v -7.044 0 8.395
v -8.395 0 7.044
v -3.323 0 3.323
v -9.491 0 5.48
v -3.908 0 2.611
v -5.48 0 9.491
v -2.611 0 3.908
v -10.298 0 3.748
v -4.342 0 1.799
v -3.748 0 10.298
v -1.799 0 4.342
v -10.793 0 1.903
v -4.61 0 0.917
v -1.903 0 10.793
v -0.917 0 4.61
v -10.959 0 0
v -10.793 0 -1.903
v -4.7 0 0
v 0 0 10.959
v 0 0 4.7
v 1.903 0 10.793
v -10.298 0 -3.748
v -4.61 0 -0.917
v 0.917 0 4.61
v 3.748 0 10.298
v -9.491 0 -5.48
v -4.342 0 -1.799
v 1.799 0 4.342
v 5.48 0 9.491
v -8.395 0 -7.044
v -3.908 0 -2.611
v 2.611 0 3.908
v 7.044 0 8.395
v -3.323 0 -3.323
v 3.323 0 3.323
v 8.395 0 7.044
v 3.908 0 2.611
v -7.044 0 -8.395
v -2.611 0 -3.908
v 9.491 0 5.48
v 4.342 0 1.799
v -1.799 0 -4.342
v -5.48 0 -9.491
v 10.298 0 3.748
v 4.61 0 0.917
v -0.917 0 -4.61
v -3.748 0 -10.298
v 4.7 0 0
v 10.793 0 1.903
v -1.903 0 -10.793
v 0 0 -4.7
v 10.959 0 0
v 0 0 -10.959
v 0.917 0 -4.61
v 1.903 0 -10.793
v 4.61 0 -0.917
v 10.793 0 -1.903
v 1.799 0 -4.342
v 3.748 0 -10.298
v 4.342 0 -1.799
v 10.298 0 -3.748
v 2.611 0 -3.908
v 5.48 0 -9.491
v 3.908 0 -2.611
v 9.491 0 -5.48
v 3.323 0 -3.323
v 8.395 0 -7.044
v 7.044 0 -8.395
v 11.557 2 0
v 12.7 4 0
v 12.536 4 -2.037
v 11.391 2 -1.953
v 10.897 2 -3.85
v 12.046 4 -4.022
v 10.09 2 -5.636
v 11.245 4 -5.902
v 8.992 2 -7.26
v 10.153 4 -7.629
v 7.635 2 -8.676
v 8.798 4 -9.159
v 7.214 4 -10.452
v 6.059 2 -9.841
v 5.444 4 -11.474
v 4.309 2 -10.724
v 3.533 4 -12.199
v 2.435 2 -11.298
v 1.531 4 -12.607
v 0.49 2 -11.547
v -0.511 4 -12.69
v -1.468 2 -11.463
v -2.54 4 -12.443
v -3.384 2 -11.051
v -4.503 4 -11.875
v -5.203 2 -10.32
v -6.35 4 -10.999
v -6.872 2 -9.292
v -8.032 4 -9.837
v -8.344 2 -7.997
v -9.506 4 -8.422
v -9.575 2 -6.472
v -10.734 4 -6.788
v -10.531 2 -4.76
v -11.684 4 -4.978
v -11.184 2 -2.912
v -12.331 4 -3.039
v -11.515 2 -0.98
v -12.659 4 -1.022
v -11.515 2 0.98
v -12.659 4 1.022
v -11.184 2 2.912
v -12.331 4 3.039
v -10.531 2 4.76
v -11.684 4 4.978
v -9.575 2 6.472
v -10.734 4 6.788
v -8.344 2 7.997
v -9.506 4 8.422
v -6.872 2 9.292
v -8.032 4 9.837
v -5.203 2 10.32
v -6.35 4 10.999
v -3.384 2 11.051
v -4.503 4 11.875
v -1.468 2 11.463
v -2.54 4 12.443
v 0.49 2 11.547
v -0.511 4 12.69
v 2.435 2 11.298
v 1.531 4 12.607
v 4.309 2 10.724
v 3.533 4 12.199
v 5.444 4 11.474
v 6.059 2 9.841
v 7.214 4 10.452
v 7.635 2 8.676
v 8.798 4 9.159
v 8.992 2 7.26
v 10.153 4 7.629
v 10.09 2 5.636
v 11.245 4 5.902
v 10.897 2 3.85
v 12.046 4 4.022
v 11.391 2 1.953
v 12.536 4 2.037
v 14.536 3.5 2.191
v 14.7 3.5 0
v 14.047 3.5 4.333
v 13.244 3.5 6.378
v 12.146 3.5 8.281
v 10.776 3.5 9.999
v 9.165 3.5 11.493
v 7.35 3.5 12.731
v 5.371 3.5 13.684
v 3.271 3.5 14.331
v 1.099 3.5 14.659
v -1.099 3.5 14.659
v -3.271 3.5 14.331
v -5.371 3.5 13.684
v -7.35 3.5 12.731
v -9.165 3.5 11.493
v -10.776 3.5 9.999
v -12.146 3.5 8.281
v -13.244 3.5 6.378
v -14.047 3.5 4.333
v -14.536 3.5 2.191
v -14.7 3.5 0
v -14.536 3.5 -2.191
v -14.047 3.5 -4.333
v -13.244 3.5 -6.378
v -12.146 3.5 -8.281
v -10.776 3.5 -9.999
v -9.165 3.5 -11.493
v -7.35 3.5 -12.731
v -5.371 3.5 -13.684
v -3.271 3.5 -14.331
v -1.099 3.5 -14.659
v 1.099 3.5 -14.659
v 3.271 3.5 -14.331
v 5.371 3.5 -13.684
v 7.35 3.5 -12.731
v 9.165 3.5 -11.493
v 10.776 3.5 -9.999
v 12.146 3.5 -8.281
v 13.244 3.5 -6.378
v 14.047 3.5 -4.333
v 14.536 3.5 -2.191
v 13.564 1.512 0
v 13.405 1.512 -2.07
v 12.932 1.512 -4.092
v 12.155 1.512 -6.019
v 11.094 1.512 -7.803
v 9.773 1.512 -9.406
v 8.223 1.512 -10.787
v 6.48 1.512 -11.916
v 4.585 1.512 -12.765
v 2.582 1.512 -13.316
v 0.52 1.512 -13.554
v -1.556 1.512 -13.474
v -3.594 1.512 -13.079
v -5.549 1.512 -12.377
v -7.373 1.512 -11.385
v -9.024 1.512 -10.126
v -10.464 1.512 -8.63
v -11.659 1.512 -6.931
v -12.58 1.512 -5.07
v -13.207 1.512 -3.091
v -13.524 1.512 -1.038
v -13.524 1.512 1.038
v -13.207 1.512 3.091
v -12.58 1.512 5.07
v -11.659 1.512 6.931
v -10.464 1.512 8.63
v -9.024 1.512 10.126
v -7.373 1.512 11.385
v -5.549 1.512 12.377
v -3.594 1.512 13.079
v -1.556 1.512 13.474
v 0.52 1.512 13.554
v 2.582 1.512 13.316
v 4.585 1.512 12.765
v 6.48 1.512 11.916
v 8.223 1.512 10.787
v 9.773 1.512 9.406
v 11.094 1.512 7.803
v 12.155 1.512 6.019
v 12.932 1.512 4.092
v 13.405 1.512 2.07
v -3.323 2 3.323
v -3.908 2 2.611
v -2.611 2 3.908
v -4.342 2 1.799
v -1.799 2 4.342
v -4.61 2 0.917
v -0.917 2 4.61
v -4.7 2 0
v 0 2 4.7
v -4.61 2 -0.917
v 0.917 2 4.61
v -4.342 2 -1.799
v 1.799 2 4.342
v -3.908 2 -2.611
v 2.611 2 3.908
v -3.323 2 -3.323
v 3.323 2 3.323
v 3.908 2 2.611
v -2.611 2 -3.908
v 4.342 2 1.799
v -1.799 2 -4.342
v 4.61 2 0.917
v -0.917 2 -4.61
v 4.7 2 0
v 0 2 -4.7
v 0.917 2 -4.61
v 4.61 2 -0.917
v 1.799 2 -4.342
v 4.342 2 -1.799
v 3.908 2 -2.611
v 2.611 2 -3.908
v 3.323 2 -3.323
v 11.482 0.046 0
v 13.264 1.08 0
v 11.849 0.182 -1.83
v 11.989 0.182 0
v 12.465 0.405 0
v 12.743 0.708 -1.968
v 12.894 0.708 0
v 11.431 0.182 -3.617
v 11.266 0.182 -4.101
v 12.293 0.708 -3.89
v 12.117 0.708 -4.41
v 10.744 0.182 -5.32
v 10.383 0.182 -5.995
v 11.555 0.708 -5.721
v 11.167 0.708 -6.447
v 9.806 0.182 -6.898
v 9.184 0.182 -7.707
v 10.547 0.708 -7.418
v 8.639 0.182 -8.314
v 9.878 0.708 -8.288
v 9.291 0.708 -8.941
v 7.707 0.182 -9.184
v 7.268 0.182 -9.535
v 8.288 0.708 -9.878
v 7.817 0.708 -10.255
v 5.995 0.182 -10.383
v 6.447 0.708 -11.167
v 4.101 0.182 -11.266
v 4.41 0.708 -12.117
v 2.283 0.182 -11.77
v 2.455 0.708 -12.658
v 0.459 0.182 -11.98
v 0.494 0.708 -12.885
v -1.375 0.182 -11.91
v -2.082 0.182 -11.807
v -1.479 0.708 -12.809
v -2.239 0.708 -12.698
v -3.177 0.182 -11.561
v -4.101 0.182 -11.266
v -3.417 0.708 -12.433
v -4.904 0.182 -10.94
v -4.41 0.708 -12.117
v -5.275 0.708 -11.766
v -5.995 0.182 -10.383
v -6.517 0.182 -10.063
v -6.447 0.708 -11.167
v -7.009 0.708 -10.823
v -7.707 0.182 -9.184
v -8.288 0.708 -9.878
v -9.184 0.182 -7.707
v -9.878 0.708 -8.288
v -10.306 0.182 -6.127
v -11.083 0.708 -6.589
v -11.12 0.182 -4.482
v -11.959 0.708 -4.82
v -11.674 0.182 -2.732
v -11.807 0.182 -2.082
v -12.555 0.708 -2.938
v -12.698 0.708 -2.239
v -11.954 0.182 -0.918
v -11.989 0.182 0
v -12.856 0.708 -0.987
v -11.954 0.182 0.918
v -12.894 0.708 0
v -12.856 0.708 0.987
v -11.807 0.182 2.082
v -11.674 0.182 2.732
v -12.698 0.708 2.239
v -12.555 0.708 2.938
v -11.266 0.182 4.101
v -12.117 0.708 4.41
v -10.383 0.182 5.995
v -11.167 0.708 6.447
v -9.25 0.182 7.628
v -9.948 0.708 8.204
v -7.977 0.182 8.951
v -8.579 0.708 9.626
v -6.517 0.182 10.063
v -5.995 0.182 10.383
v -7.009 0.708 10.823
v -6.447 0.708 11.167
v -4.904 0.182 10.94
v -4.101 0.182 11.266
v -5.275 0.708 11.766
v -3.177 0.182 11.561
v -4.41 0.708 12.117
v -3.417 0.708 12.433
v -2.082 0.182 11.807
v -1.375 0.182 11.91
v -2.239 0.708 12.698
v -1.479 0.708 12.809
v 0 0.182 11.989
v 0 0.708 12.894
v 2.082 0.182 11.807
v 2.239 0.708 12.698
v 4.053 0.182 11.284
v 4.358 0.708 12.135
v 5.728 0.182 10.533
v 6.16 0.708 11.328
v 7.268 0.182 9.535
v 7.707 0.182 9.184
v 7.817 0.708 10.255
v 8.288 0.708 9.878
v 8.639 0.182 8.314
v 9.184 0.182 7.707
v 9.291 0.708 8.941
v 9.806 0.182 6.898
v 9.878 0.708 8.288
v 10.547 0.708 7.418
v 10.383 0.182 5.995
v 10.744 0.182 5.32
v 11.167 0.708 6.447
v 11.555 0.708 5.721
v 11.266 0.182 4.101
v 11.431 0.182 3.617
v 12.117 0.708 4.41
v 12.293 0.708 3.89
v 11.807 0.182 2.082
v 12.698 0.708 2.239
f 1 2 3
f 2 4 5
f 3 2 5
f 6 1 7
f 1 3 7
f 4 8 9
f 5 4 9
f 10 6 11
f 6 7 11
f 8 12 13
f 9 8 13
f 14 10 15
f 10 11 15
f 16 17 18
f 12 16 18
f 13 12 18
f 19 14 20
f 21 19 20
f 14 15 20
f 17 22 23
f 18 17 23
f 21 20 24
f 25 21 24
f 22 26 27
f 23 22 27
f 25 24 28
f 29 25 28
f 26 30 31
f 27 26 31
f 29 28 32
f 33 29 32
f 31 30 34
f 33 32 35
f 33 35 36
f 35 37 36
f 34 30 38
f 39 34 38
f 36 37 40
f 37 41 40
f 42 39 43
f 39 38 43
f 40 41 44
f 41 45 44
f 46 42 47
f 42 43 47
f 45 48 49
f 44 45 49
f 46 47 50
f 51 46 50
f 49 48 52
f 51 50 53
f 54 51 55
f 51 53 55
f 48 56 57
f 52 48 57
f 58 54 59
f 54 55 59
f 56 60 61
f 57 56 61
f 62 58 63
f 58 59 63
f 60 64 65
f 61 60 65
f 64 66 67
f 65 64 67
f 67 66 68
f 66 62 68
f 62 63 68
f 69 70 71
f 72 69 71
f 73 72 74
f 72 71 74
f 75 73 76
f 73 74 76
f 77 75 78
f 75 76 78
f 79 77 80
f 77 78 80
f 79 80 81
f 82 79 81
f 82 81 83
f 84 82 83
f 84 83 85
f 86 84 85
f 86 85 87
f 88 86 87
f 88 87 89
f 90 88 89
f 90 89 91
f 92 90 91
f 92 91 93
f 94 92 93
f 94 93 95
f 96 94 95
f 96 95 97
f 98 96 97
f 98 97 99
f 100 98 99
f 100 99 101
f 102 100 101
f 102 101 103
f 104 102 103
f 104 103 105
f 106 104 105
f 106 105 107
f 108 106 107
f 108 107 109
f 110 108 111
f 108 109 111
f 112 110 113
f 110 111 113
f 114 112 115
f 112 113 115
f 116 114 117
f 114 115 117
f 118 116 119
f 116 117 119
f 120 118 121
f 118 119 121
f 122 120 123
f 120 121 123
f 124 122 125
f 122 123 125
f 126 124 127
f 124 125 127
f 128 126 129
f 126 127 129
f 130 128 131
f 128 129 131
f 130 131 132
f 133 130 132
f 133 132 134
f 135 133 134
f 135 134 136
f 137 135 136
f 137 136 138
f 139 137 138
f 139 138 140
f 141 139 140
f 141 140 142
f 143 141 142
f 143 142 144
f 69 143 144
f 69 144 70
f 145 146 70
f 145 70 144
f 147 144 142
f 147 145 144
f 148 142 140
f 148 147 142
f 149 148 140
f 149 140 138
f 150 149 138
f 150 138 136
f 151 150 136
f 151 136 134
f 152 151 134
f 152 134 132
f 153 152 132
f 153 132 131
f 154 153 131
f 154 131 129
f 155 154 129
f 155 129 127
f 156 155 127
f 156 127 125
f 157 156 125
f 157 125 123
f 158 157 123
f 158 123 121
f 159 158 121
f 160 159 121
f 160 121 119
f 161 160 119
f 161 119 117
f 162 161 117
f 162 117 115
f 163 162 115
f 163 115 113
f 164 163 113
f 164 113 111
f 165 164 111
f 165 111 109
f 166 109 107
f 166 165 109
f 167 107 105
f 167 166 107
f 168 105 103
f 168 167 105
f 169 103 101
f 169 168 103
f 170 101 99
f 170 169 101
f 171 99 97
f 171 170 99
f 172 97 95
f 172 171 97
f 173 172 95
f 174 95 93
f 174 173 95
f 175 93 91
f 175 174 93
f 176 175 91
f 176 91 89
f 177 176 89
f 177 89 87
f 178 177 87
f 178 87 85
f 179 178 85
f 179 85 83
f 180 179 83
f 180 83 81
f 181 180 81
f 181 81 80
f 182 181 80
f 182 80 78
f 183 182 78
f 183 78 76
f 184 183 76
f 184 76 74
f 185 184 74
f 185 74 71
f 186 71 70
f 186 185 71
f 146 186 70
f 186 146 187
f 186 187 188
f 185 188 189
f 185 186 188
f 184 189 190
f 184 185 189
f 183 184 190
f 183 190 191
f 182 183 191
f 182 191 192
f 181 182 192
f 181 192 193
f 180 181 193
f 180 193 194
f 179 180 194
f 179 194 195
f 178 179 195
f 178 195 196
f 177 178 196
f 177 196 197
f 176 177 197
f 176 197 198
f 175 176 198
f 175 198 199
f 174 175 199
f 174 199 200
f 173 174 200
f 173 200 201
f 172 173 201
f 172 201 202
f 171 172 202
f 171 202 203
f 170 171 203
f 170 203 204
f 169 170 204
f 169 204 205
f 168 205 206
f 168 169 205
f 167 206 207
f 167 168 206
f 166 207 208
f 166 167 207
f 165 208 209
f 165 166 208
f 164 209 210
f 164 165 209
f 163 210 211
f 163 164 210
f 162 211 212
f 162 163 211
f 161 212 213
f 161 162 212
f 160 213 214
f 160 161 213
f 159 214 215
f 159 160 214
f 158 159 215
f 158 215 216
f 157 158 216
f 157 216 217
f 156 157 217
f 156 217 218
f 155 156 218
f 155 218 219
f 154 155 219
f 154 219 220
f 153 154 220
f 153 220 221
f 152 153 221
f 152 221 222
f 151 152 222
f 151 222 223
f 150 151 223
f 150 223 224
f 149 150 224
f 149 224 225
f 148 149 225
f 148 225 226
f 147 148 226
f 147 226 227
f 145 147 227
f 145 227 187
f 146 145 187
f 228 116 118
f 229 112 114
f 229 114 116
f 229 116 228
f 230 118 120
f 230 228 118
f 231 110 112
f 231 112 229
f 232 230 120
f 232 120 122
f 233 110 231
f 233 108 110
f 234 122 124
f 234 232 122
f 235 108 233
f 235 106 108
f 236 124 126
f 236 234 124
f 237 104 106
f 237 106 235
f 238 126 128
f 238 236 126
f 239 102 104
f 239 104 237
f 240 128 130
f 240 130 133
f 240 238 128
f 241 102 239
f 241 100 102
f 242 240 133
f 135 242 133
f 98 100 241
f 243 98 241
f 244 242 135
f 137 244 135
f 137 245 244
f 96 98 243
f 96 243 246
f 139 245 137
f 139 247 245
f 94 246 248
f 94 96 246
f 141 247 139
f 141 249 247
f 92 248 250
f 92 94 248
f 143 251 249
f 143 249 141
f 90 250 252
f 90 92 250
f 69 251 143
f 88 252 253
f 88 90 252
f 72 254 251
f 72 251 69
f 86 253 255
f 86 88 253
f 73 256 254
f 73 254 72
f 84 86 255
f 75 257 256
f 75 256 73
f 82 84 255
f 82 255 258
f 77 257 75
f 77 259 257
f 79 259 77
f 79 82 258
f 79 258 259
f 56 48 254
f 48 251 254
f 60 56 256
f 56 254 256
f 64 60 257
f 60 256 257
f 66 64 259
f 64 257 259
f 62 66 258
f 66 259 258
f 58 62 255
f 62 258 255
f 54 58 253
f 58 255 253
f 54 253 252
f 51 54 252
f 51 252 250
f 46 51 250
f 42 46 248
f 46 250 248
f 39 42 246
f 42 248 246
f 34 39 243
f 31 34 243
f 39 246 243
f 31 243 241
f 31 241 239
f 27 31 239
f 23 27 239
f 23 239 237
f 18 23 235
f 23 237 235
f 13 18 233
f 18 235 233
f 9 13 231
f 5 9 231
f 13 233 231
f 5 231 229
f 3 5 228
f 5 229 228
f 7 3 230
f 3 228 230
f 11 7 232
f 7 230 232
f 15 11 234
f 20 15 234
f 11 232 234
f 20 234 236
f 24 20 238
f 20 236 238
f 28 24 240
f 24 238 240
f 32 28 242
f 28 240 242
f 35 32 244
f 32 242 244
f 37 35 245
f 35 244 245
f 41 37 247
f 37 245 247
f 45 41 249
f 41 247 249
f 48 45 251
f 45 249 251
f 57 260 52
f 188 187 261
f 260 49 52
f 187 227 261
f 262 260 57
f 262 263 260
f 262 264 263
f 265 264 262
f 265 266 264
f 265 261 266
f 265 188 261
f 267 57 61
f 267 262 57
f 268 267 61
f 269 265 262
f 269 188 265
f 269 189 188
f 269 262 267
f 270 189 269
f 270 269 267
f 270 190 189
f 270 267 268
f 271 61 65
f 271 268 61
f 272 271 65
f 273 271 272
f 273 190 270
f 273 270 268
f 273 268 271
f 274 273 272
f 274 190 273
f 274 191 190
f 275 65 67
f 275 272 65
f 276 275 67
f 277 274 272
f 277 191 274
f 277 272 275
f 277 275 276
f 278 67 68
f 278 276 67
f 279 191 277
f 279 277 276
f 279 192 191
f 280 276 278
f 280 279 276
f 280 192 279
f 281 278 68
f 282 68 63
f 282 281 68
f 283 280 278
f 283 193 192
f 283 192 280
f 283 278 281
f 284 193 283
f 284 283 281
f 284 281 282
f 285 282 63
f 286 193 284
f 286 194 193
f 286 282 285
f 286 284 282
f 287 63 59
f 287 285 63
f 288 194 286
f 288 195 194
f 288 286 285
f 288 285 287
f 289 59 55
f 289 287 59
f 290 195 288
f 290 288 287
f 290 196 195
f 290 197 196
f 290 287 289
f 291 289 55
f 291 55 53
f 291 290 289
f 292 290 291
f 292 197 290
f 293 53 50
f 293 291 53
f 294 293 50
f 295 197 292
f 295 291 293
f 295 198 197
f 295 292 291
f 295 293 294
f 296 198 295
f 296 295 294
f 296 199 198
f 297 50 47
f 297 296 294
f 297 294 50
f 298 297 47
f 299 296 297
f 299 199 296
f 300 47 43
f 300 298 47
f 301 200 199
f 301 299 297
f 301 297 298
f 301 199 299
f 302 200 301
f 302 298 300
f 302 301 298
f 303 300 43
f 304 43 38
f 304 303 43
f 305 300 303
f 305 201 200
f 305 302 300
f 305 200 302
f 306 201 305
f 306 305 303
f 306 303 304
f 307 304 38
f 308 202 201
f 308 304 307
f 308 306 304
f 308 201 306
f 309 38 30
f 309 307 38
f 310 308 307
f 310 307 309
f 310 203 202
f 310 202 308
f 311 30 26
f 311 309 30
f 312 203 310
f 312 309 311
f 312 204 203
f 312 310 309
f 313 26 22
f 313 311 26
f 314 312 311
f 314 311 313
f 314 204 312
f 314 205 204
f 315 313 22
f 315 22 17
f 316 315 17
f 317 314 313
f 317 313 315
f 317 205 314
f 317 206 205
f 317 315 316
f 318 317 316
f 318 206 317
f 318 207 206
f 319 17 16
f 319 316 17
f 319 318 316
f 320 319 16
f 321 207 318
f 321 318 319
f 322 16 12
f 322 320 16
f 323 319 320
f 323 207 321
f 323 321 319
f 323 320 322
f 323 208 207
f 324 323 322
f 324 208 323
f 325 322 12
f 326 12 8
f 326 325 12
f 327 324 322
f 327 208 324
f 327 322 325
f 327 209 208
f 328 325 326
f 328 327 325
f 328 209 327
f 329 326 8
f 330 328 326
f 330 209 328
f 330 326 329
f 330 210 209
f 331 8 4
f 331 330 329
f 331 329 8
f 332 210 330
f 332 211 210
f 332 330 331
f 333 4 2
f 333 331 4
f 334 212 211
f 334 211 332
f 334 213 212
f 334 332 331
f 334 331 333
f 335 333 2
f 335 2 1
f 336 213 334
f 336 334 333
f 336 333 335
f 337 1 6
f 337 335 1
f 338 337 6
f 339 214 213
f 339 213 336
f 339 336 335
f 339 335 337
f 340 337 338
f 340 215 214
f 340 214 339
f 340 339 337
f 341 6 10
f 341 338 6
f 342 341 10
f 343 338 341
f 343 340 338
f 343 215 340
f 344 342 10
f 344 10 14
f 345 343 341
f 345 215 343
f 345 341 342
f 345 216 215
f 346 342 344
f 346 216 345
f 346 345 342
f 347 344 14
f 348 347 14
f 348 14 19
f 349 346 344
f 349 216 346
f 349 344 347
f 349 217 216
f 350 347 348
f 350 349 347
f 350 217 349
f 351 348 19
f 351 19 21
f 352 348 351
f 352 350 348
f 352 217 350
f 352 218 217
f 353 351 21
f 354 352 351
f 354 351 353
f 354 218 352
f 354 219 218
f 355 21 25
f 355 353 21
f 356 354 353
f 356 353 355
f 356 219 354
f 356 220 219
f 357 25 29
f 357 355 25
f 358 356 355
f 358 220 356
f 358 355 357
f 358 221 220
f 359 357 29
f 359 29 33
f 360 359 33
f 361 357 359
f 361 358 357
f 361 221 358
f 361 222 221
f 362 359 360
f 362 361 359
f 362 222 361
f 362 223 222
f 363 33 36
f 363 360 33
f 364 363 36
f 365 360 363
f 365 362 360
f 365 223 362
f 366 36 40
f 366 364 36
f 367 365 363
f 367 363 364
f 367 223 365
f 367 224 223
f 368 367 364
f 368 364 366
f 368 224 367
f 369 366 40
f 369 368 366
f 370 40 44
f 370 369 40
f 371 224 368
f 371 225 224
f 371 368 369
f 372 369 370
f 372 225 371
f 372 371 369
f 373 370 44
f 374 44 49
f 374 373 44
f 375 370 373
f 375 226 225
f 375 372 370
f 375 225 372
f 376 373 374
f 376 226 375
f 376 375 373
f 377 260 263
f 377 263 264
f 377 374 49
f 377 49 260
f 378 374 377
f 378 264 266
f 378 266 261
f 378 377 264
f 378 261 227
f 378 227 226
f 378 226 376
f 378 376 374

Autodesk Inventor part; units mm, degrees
ref_plane "YZ Plane" through (0, 0, 0) normal (1, 0, 0) x (0, 1, 0)
ref_plane "XZ Plane" through (0, 0, 0) normal (0, 1, 0) x (-1, 0, 0)
ref_plane "XY Plane" through (0, 0, 0) normal (0, 0, 1) x (1, 0, 0)
sketch "Sketch1" plane through (0, 0, 0) normal (0, 0, 1) x (1, 0, 0)
  line L0 (0, 0) -> (12.7, 0)
  line L1 (14.7, 0) -> (14.7, 3.5) construction
  line L2 (14.7, 3.5) -> (12.7, 3.5) construction
  line L3 (0, 0) -> (0, 2)
  line L4 (12.7, 3.5) -> (12.7, 4) construction
  line L5 (14.7, 3.5) -> (12.7, 4)
  line L6 (14.7, 3.5) -> (12.7, 0)
  line L7 (12.7, 4) -> (11.5571, 2)
  line L8 (0, 2) -> (11.5571, 2)
  dimension "d0" = 14.7
  dimension "d1" = 3.5
  dimension "d2" = 2
  dimension "d3" = 0.5
  dimension "d4" = 2
  dimension "d10" = 2
revolve "Revolution1" add sketch "Sketch1" angle 360 about axis through (0, 0, 0) along (0, 1, 0)
sketch "Sketch2" plane through (0, 2, 0) normal (0, 1, 0) x (1, 0, 0)
  circle A0 centre (0, 0) radius 4.7
  dimension "d6" = 9.4
extrude "Extrusion1" cut sketch "Sketch2" against normal through all
fillet "Fillet1" radius 3 1 edges at (-12.7, 0, 0)
properties part number "BottomBushingWasher" material "Aluminum"
